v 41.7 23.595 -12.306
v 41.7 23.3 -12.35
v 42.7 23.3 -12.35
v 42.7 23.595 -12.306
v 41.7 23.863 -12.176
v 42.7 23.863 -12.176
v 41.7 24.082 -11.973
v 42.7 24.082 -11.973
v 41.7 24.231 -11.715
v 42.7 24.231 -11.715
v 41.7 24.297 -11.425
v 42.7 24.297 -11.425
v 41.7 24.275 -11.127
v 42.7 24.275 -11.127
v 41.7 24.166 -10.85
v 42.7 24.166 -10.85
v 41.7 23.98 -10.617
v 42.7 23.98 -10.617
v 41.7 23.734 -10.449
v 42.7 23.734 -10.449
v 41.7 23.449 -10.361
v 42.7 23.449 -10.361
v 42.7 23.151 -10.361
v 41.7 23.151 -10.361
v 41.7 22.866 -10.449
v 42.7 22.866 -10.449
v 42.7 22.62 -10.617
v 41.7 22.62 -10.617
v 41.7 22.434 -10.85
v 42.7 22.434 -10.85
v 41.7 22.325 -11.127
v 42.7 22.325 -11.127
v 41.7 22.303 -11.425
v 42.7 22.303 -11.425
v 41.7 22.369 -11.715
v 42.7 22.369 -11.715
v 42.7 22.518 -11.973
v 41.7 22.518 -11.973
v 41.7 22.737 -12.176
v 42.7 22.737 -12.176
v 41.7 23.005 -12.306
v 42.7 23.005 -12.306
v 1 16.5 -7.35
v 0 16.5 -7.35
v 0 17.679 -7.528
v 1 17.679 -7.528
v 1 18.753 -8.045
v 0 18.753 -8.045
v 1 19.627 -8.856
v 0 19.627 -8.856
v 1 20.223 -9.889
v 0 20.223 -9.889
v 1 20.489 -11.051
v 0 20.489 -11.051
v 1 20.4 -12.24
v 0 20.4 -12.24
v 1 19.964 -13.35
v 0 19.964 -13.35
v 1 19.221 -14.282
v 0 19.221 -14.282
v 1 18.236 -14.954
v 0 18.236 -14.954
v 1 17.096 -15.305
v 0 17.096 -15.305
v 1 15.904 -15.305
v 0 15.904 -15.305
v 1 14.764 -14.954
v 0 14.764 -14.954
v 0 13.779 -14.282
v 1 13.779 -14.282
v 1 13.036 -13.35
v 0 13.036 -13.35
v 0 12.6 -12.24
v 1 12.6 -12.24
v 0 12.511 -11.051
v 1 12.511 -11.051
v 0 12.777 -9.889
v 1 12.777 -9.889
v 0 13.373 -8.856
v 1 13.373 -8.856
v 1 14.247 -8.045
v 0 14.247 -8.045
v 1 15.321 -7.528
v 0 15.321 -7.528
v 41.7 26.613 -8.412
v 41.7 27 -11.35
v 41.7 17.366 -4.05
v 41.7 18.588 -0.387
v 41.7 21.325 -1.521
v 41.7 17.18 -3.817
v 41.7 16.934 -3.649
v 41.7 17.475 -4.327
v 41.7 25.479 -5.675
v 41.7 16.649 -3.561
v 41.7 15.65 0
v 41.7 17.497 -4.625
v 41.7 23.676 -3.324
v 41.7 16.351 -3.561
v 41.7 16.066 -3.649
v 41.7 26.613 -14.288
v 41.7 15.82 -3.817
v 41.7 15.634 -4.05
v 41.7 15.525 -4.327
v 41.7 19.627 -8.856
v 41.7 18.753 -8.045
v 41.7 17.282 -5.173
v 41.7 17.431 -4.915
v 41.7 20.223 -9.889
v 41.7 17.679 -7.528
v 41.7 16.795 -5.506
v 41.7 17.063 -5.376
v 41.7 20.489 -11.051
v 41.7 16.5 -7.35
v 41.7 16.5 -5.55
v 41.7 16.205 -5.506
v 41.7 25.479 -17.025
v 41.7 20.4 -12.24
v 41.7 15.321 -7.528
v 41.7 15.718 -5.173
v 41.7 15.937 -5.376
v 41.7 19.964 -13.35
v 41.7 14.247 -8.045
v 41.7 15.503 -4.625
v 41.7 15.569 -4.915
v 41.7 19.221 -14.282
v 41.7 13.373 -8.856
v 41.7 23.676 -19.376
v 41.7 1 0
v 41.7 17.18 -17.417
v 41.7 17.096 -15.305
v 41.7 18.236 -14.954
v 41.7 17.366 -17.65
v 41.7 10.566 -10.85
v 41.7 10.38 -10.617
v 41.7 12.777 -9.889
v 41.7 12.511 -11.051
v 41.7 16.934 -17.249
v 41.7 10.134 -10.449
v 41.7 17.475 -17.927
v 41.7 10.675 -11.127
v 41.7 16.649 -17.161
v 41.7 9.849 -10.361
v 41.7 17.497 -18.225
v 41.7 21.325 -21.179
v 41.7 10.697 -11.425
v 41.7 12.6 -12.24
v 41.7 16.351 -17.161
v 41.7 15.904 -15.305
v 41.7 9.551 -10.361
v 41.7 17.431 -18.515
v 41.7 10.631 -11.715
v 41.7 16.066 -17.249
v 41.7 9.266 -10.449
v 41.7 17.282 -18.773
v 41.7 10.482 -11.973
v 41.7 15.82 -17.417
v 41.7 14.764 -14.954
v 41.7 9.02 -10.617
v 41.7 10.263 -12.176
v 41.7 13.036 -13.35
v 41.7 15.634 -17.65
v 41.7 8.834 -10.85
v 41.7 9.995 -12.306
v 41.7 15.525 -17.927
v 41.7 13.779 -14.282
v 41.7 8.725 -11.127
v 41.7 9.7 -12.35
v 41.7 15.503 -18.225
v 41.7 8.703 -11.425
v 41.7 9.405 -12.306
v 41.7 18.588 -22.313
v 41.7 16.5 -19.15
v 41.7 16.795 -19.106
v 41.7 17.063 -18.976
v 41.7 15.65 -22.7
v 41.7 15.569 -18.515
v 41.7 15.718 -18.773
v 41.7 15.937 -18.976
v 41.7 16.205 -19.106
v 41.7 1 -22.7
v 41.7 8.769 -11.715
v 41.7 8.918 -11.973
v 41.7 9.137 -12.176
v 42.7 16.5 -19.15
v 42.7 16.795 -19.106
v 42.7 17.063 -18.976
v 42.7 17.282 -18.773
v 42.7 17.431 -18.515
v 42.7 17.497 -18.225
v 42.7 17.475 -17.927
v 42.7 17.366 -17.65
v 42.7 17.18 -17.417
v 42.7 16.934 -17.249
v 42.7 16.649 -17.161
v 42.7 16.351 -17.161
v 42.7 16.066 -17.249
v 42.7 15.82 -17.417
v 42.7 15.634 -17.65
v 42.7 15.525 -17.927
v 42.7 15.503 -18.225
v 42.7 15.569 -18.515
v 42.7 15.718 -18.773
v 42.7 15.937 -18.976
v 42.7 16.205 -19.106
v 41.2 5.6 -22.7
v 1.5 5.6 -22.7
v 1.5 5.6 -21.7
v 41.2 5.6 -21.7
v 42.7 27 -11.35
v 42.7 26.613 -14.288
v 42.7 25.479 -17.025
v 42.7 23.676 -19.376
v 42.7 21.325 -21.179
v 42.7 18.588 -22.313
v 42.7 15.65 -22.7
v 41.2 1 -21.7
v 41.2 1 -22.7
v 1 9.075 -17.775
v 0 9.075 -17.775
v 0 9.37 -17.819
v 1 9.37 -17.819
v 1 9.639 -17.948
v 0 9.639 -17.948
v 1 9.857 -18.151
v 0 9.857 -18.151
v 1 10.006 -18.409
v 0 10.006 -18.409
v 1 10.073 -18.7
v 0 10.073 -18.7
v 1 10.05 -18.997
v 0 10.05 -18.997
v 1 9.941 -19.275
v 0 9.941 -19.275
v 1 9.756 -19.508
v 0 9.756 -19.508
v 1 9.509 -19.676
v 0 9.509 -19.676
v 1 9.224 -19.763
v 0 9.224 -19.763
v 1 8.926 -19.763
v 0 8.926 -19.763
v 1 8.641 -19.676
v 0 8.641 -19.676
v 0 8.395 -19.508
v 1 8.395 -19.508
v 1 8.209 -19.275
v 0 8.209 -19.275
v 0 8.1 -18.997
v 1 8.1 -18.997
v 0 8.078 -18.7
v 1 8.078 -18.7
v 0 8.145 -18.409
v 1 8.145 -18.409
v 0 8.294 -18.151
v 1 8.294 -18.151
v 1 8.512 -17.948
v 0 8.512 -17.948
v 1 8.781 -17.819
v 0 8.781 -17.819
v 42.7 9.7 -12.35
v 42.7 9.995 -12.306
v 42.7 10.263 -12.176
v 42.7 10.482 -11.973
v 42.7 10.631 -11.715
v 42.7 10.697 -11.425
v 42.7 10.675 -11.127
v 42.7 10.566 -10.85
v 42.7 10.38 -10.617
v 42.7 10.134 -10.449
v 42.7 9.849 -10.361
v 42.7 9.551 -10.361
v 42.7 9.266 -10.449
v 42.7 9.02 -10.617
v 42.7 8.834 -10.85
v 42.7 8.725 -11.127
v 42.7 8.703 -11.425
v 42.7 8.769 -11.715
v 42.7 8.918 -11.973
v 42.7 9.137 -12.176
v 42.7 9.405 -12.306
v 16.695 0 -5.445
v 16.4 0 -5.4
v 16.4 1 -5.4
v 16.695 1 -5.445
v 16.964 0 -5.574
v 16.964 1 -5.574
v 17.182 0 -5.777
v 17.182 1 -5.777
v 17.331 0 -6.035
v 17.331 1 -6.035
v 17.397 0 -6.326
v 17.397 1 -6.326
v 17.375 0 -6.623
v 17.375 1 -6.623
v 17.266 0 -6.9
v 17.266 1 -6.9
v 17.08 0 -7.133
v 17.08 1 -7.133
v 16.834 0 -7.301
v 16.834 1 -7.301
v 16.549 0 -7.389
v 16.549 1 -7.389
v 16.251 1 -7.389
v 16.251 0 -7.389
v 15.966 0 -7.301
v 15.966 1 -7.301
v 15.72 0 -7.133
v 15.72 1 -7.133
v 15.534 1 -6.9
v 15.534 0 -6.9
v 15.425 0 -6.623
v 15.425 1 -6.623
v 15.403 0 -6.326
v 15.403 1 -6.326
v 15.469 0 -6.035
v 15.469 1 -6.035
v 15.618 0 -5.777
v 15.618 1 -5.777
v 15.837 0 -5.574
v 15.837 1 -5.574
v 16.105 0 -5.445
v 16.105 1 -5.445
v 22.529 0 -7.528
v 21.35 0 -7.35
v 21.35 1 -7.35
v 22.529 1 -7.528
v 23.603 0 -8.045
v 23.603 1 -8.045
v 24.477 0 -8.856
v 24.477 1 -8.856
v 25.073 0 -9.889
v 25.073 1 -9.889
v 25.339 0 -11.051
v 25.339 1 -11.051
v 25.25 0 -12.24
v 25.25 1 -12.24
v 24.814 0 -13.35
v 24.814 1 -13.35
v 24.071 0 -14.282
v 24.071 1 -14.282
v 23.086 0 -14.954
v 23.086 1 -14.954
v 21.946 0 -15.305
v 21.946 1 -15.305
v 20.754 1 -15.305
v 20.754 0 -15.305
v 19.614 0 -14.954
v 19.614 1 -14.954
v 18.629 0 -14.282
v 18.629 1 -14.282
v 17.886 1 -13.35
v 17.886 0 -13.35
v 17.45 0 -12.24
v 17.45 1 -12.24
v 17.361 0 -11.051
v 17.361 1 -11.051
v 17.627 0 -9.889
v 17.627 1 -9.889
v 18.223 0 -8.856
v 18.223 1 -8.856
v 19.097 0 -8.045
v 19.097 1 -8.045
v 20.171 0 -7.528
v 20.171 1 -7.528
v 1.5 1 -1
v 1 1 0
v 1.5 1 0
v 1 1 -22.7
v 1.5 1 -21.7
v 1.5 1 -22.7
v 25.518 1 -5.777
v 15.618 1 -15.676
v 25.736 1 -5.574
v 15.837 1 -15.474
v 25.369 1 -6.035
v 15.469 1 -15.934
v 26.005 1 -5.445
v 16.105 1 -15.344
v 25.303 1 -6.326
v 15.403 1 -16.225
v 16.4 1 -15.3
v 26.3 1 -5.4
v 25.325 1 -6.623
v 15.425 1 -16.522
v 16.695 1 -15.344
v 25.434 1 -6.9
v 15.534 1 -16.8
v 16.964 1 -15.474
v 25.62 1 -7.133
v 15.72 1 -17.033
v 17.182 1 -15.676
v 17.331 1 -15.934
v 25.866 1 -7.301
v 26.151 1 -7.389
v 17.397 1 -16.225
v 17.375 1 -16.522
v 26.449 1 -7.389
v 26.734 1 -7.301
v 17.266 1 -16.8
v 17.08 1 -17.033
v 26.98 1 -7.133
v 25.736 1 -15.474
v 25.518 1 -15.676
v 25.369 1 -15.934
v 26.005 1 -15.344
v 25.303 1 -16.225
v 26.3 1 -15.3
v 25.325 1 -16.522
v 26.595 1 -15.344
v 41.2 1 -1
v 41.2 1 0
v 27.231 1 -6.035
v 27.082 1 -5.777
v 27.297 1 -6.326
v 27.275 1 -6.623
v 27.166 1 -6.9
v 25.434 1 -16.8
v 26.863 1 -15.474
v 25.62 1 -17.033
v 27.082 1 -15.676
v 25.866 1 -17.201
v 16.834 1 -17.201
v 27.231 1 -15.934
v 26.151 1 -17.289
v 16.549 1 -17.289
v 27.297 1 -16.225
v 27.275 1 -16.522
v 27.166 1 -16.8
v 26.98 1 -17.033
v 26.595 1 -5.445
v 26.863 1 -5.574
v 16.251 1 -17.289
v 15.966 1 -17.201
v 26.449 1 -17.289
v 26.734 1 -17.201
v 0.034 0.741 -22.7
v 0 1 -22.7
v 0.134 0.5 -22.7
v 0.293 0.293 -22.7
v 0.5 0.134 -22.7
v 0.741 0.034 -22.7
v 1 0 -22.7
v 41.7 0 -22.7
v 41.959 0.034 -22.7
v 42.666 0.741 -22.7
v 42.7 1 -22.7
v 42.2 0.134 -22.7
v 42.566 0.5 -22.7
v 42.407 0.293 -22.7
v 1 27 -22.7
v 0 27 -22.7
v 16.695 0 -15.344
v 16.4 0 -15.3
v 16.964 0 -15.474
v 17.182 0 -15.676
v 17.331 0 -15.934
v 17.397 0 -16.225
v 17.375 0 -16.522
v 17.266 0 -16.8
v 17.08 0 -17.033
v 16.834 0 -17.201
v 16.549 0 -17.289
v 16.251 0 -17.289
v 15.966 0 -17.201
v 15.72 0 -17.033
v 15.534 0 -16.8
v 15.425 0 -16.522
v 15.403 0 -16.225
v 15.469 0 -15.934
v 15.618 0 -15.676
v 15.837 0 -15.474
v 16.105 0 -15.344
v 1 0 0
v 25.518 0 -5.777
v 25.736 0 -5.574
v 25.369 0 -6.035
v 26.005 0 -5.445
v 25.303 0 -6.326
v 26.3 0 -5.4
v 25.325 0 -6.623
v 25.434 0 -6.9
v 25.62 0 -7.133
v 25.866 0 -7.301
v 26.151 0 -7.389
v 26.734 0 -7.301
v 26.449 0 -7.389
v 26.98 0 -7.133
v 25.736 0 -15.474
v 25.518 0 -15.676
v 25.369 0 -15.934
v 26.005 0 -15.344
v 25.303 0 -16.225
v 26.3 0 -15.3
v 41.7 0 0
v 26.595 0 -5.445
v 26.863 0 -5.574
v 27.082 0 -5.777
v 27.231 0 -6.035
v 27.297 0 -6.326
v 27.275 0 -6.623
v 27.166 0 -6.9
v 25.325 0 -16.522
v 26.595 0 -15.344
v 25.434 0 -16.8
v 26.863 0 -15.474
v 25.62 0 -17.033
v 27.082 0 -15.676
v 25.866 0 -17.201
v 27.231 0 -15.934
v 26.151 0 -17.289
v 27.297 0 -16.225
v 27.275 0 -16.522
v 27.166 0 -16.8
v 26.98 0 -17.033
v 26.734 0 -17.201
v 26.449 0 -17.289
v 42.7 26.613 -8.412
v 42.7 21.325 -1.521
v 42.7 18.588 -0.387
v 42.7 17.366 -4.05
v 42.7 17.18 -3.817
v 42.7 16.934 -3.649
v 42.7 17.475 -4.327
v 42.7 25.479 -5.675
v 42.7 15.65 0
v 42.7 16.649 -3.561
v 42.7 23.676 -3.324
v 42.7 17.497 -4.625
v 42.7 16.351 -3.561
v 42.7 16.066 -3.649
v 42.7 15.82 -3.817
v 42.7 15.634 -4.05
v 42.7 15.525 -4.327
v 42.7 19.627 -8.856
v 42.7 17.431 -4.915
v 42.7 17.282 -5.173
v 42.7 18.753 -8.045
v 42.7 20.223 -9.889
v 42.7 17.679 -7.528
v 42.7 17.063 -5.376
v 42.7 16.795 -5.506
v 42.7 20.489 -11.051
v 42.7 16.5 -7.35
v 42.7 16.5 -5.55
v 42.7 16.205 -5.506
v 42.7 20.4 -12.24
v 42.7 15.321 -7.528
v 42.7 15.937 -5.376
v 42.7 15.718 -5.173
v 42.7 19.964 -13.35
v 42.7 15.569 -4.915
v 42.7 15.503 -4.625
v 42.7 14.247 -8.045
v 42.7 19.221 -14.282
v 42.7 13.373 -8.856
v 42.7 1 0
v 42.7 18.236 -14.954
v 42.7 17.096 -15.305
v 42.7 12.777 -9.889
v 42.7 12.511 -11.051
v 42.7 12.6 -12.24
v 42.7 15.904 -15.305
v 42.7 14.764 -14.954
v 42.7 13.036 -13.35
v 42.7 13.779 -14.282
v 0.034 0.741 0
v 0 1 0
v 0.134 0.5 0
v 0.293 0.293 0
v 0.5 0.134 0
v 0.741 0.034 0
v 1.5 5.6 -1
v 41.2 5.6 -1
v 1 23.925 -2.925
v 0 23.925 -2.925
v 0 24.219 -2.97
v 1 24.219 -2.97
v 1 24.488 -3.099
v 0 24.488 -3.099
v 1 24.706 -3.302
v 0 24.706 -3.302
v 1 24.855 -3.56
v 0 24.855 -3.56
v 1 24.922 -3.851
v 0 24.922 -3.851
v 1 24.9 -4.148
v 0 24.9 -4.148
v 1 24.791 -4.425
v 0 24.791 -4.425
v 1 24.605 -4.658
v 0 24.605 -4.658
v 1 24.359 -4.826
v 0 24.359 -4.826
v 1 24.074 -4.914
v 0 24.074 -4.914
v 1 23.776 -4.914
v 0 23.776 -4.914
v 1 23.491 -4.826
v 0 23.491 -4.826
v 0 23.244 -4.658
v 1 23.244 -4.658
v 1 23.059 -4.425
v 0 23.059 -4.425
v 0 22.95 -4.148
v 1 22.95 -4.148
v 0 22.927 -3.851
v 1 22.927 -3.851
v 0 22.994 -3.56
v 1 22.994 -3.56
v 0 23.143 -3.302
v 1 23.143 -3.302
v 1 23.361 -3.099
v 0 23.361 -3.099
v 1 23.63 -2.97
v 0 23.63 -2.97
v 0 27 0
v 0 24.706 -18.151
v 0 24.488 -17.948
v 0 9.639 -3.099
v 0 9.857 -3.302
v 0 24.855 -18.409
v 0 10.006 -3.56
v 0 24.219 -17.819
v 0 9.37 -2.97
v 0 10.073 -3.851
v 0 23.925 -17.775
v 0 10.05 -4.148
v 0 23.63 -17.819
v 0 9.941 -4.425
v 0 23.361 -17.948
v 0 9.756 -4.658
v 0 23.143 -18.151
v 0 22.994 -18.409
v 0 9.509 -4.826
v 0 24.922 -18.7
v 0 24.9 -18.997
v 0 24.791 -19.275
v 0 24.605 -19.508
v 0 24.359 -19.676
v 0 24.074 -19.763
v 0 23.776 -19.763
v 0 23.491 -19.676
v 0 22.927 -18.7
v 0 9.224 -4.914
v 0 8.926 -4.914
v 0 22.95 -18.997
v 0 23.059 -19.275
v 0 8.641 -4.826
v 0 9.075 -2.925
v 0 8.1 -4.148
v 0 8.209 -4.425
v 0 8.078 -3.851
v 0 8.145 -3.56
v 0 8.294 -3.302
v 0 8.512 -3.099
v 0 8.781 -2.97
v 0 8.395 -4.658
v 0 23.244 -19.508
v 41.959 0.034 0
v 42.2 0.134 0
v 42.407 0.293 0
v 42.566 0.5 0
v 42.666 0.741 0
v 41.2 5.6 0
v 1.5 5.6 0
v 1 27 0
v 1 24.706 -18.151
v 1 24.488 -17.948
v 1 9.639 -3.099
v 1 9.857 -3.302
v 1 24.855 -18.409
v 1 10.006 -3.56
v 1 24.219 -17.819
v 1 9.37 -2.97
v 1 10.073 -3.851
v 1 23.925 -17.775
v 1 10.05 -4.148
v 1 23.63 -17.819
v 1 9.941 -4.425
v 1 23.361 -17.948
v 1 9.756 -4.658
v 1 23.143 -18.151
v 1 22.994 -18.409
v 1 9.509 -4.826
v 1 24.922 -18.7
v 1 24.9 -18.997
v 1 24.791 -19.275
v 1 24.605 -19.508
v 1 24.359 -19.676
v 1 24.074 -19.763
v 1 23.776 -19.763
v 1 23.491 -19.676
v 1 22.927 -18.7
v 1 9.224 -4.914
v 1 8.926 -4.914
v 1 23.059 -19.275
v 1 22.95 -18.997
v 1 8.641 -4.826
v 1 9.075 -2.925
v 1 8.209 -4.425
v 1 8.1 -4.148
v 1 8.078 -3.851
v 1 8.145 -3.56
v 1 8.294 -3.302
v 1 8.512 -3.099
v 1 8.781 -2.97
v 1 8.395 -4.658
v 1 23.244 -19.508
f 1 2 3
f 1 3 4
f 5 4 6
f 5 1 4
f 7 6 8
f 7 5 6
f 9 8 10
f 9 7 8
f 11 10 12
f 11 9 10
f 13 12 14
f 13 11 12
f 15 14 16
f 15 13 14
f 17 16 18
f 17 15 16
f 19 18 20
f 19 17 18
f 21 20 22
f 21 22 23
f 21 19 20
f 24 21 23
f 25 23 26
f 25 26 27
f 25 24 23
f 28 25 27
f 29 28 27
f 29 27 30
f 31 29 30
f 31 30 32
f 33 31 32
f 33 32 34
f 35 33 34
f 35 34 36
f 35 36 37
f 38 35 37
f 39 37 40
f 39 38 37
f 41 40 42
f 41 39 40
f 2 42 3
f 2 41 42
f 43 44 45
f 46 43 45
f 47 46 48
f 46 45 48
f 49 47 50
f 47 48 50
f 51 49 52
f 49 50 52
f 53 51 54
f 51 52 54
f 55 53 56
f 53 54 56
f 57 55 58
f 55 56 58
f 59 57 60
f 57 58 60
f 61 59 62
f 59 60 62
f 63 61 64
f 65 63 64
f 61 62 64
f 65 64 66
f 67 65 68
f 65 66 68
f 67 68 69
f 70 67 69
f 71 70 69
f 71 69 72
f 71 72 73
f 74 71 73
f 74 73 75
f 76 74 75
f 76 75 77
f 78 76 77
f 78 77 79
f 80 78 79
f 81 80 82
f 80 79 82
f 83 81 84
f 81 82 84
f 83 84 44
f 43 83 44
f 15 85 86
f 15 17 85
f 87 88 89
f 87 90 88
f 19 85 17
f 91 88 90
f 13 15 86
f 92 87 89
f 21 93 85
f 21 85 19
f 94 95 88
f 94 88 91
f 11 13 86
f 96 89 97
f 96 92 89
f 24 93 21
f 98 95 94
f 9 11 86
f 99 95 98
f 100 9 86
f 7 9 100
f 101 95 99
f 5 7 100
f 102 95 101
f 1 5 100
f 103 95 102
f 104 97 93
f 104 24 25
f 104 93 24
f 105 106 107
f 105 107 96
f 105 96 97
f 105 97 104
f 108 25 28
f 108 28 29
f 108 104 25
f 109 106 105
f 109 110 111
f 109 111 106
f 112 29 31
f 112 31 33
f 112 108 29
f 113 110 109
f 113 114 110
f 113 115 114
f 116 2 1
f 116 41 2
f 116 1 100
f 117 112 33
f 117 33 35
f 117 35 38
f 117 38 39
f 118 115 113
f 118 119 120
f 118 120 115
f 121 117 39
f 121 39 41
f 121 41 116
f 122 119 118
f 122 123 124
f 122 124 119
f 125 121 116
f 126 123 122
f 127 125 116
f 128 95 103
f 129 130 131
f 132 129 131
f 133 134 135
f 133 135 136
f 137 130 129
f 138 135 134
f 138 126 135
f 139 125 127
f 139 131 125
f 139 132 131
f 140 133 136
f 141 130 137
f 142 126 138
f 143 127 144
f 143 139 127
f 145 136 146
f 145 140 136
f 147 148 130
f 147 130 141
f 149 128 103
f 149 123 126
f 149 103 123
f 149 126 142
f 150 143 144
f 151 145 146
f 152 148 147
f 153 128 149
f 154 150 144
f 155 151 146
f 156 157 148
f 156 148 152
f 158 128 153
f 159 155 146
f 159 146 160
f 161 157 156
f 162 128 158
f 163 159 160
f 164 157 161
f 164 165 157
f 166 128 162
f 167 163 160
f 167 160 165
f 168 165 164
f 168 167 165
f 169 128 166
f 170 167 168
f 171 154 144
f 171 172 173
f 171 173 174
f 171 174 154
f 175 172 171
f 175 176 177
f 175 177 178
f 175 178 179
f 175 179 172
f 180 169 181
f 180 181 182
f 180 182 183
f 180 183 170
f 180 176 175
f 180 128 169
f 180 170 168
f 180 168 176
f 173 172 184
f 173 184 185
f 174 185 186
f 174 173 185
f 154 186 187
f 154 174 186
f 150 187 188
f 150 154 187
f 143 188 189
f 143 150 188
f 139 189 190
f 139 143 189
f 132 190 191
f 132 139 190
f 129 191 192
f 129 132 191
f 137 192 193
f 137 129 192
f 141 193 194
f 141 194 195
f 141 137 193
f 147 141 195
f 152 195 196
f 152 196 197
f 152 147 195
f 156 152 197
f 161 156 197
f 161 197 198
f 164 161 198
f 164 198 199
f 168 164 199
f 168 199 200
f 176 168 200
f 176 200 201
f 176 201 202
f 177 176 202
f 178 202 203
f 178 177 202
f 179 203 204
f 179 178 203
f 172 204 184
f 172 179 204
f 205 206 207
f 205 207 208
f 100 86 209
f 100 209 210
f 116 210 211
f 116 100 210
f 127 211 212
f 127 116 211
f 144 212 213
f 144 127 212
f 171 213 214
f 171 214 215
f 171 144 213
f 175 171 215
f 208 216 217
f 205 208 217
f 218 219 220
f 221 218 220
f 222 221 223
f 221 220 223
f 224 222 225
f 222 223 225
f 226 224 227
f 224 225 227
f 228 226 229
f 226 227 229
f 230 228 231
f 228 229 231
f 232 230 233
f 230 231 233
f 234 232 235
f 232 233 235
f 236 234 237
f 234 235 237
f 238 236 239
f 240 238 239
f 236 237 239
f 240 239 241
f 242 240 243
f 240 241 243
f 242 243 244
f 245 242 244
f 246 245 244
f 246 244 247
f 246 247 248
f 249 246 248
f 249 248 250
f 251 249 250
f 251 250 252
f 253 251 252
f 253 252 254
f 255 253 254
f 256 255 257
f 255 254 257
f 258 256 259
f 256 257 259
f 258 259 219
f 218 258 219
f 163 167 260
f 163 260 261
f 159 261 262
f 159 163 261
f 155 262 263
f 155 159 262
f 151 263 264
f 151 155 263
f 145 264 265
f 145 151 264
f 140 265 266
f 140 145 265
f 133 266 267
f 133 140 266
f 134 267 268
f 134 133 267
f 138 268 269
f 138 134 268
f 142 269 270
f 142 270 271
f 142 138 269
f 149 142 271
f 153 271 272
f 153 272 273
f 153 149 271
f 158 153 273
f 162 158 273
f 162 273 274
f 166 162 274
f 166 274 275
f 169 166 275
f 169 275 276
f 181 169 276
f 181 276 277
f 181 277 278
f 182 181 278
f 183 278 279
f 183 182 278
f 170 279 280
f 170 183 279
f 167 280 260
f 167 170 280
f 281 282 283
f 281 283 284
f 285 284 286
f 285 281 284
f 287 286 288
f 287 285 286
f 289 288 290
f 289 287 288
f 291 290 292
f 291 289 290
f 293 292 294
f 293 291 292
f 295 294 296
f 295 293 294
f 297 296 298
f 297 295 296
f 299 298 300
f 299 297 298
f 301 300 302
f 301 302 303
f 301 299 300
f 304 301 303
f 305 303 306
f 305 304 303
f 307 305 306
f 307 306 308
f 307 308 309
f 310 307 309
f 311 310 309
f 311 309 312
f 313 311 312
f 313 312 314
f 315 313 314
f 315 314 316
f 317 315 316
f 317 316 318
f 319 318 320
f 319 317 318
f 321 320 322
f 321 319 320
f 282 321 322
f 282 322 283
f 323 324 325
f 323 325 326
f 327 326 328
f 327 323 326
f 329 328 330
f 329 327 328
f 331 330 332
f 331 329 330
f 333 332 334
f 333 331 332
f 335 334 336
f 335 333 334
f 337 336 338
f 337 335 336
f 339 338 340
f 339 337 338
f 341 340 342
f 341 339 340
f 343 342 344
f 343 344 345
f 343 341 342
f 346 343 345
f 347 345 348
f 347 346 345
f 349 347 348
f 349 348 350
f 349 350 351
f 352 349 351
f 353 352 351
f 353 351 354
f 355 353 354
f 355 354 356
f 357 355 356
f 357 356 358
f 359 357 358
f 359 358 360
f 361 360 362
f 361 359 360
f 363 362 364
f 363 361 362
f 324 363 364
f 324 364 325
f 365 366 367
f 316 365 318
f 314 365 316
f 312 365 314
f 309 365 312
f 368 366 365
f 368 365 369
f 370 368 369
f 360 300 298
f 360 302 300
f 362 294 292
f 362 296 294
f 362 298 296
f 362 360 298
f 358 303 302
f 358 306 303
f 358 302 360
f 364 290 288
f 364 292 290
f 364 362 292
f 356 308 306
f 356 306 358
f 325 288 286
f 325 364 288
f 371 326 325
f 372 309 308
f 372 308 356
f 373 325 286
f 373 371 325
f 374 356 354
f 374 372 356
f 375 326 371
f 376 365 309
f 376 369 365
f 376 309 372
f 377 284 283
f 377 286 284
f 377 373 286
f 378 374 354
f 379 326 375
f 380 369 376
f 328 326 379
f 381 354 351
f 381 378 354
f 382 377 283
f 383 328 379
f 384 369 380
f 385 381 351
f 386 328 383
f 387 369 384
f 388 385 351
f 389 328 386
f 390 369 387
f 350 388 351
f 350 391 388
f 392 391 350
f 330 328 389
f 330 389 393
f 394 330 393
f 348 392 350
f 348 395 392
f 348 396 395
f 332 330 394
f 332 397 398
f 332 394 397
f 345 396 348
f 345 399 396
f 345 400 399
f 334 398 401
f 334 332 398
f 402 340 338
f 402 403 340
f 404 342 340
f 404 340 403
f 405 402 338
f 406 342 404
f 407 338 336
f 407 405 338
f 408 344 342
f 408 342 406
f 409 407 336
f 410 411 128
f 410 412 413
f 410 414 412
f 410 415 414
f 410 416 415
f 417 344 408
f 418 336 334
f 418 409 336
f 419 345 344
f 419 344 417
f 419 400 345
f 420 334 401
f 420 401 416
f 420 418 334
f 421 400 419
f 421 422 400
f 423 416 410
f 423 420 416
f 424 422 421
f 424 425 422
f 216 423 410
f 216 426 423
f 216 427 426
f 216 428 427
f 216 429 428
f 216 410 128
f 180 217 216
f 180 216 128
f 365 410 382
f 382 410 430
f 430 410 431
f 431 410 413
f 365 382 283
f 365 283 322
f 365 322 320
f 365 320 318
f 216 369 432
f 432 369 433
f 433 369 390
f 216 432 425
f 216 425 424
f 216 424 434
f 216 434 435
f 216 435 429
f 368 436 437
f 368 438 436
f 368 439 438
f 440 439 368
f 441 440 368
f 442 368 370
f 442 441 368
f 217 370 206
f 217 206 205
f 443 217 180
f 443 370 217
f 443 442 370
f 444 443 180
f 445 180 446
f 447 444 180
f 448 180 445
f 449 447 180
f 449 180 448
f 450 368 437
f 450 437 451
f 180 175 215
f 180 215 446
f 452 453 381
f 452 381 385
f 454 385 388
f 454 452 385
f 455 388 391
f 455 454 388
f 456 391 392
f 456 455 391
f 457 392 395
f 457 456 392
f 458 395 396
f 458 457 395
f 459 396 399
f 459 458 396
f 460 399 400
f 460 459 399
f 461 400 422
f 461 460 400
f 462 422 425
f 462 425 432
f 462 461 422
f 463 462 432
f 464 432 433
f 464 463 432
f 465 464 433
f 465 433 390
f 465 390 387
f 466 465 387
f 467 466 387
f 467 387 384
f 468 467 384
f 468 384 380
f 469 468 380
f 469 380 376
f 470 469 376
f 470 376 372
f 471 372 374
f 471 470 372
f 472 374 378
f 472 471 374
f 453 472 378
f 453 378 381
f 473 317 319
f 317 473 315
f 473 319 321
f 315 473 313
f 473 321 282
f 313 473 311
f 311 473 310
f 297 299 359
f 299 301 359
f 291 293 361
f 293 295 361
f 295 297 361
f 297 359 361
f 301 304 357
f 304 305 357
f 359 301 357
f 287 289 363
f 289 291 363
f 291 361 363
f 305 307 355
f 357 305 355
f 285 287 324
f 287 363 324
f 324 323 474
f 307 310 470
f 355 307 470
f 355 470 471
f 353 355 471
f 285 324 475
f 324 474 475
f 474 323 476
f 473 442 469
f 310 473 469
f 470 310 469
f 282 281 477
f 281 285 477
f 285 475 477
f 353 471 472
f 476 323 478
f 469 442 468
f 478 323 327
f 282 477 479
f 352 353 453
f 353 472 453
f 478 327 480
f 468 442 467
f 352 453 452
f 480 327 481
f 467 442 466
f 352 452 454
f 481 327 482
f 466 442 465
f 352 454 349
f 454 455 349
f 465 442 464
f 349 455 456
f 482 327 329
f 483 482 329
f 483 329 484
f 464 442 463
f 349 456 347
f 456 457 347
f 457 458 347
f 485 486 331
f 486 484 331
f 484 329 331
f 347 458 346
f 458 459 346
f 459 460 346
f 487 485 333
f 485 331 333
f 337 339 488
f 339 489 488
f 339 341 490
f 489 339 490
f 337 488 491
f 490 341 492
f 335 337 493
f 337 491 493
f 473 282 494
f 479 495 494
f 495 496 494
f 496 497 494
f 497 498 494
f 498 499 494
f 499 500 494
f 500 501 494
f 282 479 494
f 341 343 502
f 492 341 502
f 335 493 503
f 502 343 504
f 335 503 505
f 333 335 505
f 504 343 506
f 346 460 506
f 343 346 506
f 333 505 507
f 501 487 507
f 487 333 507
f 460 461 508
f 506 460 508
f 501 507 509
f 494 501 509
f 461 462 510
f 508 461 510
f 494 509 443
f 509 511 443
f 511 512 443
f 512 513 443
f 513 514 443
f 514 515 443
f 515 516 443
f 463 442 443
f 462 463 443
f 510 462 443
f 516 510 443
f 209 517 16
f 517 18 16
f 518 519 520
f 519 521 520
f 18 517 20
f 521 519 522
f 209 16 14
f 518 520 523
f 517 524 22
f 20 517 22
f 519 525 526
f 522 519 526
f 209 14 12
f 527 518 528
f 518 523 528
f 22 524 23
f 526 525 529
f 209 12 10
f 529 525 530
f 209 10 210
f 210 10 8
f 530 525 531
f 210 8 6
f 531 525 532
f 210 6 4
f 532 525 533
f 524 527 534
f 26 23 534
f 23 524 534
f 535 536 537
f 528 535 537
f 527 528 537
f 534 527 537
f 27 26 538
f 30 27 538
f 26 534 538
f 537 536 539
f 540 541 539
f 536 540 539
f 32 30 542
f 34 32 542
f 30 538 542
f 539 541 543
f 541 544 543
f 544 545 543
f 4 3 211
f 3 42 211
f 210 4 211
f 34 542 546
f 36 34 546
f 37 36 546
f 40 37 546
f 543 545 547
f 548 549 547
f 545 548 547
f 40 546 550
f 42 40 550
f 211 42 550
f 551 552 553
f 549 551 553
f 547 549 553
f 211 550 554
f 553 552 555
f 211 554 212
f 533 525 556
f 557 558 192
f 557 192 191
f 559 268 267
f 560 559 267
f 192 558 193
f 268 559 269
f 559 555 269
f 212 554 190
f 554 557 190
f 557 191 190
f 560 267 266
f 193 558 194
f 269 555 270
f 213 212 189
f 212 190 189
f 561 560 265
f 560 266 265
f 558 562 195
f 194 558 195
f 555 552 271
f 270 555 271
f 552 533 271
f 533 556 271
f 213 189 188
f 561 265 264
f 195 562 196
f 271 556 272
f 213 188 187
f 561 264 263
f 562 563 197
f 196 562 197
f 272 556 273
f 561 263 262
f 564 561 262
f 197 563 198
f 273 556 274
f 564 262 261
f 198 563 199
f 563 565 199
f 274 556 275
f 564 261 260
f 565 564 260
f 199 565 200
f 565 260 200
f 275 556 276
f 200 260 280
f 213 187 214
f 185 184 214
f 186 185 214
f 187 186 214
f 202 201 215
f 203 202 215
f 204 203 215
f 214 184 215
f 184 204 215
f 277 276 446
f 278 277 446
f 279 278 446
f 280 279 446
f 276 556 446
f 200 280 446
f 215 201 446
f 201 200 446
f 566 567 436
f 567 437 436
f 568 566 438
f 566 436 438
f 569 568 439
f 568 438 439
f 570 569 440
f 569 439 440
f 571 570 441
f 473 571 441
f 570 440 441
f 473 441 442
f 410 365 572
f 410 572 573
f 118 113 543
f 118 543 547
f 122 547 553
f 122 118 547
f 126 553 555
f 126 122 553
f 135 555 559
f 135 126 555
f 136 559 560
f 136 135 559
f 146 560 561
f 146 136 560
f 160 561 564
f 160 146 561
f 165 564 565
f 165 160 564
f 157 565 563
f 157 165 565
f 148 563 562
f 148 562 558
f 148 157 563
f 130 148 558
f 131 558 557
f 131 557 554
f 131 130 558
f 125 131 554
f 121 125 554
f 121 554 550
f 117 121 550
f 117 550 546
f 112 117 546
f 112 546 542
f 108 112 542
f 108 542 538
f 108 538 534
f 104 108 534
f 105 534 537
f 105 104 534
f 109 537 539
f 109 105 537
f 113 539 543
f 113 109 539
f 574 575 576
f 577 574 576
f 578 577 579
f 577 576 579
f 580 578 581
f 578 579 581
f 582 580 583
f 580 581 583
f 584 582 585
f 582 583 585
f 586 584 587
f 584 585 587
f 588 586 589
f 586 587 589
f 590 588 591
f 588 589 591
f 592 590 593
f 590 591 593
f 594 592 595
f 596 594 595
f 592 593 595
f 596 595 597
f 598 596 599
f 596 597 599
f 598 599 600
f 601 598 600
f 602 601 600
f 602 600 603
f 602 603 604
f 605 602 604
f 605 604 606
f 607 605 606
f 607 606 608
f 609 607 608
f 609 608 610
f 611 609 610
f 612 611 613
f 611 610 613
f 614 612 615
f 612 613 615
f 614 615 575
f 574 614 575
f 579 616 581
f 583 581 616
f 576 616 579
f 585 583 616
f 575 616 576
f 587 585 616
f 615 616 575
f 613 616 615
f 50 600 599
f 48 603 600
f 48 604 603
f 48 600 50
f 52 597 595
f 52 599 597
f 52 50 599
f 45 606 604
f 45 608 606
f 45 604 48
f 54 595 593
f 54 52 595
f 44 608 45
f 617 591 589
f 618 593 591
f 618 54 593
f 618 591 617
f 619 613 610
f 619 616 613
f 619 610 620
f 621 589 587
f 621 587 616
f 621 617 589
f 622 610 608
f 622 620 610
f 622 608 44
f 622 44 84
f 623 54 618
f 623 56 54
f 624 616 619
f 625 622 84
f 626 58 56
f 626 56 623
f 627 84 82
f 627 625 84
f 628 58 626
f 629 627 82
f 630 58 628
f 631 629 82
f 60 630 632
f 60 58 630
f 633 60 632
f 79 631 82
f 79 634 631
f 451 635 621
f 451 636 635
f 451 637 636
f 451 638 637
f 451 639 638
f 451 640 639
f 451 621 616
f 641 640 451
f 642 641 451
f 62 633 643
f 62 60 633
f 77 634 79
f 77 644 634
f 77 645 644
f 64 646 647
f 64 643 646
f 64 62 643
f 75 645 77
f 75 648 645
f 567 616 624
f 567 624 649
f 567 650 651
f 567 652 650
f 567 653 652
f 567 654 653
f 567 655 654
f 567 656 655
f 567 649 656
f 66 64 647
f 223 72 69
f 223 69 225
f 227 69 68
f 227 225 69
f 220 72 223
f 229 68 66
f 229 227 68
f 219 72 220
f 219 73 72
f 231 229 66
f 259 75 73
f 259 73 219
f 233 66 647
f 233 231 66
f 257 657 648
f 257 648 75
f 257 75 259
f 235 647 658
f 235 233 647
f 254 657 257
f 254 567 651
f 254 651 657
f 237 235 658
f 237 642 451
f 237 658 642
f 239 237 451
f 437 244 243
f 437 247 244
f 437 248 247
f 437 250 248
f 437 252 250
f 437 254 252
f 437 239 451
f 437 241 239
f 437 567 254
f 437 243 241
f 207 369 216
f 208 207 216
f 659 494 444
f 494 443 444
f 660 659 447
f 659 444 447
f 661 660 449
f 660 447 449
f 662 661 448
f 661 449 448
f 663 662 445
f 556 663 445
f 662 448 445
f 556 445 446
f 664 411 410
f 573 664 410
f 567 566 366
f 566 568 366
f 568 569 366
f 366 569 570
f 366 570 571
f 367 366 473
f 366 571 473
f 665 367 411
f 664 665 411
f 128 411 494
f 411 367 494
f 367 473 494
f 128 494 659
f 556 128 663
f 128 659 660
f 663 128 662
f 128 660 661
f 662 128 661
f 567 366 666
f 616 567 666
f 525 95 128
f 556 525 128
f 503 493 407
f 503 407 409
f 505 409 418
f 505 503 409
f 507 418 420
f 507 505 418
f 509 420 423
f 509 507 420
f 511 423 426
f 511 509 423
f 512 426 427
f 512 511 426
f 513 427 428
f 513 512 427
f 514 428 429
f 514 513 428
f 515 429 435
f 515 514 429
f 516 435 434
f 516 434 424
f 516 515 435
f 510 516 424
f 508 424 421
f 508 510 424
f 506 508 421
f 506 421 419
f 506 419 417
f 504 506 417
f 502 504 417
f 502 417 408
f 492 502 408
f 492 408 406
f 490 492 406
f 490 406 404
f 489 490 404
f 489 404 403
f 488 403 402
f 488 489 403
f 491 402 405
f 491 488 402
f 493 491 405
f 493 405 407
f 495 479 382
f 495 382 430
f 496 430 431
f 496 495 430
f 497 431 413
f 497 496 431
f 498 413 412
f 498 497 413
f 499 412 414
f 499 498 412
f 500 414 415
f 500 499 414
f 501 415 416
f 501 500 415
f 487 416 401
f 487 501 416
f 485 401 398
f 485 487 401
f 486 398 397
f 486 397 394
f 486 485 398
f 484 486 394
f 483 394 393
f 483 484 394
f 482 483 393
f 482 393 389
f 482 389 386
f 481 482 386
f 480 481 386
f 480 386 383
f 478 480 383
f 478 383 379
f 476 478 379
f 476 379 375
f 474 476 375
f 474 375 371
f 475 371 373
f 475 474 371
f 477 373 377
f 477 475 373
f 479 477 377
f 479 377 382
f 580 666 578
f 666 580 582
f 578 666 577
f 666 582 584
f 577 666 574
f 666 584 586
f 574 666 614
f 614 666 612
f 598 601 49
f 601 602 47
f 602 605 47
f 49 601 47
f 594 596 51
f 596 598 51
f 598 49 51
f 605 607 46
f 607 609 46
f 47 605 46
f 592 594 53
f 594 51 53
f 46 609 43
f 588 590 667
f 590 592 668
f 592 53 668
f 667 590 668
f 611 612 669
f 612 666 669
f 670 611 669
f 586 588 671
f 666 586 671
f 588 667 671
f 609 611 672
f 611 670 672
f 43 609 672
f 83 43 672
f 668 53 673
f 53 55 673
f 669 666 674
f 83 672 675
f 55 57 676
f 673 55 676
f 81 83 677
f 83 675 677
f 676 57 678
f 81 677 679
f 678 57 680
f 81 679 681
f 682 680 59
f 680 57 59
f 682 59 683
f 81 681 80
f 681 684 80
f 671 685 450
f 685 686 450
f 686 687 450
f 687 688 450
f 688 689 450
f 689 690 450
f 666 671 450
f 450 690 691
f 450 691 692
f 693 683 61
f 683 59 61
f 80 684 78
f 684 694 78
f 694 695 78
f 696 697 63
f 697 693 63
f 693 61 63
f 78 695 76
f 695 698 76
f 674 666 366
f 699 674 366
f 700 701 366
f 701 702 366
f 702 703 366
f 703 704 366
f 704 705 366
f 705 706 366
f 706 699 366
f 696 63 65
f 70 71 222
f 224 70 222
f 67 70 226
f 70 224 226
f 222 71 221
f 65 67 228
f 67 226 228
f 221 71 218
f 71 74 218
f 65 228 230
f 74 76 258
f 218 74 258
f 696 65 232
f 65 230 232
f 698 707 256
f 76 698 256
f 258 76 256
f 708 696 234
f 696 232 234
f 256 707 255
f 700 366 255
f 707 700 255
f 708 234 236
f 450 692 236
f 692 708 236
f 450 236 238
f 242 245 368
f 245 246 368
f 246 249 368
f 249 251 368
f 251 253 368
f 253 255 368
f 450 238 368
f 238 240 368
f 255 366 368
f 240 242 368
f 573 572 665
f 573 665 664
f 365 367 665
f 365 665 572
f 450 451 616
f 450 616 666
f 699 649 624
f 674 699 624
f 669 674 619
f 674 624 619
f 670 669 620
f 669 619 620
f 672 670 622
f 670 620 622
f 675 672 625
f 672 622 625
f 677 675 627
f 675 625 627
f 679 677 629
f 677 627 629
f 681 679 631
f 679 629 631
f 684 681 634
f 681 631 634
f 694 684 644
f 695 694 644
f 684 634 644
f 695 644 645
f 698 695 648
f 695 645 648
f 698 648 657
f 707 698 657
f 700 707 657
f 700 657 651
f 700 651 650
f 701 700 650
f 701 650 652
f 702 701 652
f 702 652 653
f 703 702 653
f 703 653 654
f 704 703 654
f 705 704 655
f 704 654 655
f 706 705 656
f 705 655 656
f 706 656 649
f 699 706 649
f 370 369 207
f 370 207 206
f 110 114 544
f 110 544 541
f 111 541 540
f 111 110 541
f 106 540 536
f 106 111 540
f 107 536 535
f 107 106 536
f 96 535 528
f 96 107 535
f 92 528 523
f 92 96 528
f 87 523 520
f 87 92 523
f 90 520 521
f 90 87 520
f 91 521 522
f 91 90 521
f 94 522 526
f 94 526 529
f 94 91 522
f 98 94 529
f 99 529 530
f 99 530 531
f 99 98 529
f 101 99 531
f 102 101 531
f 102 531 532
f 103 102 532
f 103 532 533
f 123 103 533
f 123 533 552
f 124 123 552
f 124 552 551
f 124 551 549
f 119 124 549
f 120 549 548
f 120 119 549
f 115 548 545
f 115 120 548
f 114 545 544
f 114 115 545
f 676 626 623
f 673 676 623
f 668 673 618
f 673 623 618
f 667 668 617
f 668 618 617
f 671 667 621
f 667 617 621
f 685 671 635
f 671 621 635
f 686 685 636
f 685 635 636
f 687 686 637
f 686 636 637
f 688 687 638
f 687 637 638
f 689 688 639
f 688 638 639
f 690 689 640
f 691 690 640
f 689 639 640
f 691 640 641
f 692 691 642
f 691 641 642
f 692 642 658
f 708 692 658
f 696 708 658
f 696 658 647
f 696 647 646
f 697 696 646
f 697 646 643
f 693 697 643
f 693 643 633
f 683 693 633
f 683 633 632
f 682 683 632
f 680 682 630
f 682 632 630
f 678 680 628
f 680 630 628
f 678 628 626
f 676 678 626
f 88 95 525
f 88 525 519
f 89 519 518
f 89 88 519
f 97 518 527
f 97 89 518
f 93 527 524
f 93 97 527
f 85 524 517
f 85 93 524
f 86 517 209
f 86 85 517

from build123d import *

# Parameters (mm, degrees)
SKETCH1_W           = 42.7
SKETCH1_H           = 22.7
SKETCH1_R           = 4
SKETCH1_R_2         = 1
BOSS_EXTRUDE1_DEPTH = 1
SKETCH2_W           = 1
SKETCH2_H           = 22.7
BOSS_EXTRUDE2_DEPTH = 26
SKETCH3_W           = 39.7
SKETCH3_H           = 1
BOSS_EXTRUDE3_DEPTH = 4.6
FILLET2_R           = 1
SKETCH4_R           = 4
SKETCH4_R_2         = 1
CUT_EXTRUDE1_DEPTH  = 1
CUT_EXTRUDE2_START  = -1
SKETCH5_R           = 1
SKETCH5_R_2         = 4
CUT_EXTRUDE2_DEPTH  = 1


with BuildPart() as part:
    # Sketch1 → Boss-Extrude1 (new body)
    with BuildSketch(Plane(origin=(0, 0, 0), x_dir=(1, 0, 0), z_dir=(0, 1, 0))):
        with Locations((21.35, 11.35)):
            Rectangle(SKETCH1_W, SKETCH1_H)
        with Locations(Location((21.35, 11.35, 0), (0, 0, 270))):
            Circle(SKETCH1_R, mode=Mode.SUBTRACT)
        with Locations(Location((26.299747468, 16.299747468, 0), (0, 0, 270))):
            Circle(SKETCH1_R_2, mode=Mode.SUBTRACT)
        with Locations(Location((26.299747468, 6.400252532, 0), (0, 0, 270))):
            Circle(SKETCH1_R_2, mode=Mode.SUBTRACT)
        with Locations(Location((16.400252532, 6.400252532, 0), (0, 0, 270))):
            Circle(SKETCH1_R_2, mode=Mode.SUBTRACT)
        with Locations(Location((16.400252532, 16.299747468, 0), (0, 0, 270))):
            Circle(SKETCH1_R_2, mode=Mode.SUBTRACT)
    extrude(amount=BOSS_EXTRUDE1_DEPTH)

    # Sketch2 → Boss-Extrude2 (add)
    with BuildSketch(Plane(origin=(0, 1, 0), x_dir=(1, 0, 0), z_dir=(0, 1, 0))):
        with Locations((0.5, 11.35)):
            Rectangle(SKETCH2_W, SKETCH2_H)
        with Locations((42.2, 11.35)):
            Rectangle(SKETCH2_W, SKETCH2_H)
    extrude(amount=BOSS_EXTRUDE2_DEPTH)

    # Sketch3 → Boss-Extrude3 (add)
    with BuildSketch(Plane(origin=(0, 1, 0), x_dir=(1, 0, 0), z_dir=(0, 1, 0))):
        with Locations((21.35, 22.2)):
            Rectangle(SKETCH3_W, SKETCH3_H)
        with Locations((21.35, 0.5)):
            Rectangle(SKETCH3_W, SKETCH3_H)
    extrude(amount=BOSS_EXTRUDE3_DEPTH)

    # Fillet2
    fillet2_edges = [part.edges().sort_by_distance(p)[0] for p in [
        (42.7, 0, -11.35),
        (0, 0, -11.35),
    ]]
    fillet(fillet2_edges, radius=FILLET2_R)

    # Sketch4 → Cut-Extrude1 (cut)
    with BuildSketch(Plane.ZY):
        with Locations((-11.35, 16.5)):
            Circle(SKETCH4_R)
        with Locations((-18.774621202, 23.924621202)):
            Circle(SKETCH4_R_2)
        with Locations((-3.925378798, 23.924621202)):
            Circle(SKETCH4_R_2)
        with Locations((-3.925378798, 9.075378798)):
            Circle(SKETCH4_R_2)
        with Locations((-18.774621202, 9.075378798)):
            Circle(SKETCH4_R_2)
    extrude(amount=-CUT_EXTRUDE1_DEPTH, mode=Mode.SUBTRACT)

    # Sketch5 → Cut-Extrude2 (cut)
    with BuildSketch(Plane(origin=(42.7, 0, 0), x_dir=(0, 0, -1), z_dir=(1, 0, 0)).offset(CUT_EXTRUDE2_START)):
        with BuildLine():
            Line((0, 27), (0, 15.65))
            ThreePointArc((0, 15.65), (3.324338034, 23.675661966), (11.35, 27))
            Line((11.35, 27), (0, 27))
        make_face()
        with BuildLine():
            Line((22.7, 27), (11.35, 27))
            ThreePointArc((11.35, 27), (19.375661966, 23.675661966), (22.7, 15.65))
            Line((22.7, 15.65), (22.7, 27))
        make_face()
        with Locations((11.35, 23.3)):
            Circle(SKETCH5_R)
        with Locations(Location((11.35, 16.5, 0), (0, 0, 180))):
            Circle(SKETCH5_R_2)
        with Locations((18.15, 16.5)):
            Circle(SKETCH5_R)
        with Locations((11.35, 9.7)):
            Circle(SKETCH5_R)
        with Locations((4.55, 16.5)):
            Circle(SKETCH5_R)
    extrude(amount=CUT_EXTRUDE2_DEPTH, mode=Mode.SUBTRACT)


solid = part.part
